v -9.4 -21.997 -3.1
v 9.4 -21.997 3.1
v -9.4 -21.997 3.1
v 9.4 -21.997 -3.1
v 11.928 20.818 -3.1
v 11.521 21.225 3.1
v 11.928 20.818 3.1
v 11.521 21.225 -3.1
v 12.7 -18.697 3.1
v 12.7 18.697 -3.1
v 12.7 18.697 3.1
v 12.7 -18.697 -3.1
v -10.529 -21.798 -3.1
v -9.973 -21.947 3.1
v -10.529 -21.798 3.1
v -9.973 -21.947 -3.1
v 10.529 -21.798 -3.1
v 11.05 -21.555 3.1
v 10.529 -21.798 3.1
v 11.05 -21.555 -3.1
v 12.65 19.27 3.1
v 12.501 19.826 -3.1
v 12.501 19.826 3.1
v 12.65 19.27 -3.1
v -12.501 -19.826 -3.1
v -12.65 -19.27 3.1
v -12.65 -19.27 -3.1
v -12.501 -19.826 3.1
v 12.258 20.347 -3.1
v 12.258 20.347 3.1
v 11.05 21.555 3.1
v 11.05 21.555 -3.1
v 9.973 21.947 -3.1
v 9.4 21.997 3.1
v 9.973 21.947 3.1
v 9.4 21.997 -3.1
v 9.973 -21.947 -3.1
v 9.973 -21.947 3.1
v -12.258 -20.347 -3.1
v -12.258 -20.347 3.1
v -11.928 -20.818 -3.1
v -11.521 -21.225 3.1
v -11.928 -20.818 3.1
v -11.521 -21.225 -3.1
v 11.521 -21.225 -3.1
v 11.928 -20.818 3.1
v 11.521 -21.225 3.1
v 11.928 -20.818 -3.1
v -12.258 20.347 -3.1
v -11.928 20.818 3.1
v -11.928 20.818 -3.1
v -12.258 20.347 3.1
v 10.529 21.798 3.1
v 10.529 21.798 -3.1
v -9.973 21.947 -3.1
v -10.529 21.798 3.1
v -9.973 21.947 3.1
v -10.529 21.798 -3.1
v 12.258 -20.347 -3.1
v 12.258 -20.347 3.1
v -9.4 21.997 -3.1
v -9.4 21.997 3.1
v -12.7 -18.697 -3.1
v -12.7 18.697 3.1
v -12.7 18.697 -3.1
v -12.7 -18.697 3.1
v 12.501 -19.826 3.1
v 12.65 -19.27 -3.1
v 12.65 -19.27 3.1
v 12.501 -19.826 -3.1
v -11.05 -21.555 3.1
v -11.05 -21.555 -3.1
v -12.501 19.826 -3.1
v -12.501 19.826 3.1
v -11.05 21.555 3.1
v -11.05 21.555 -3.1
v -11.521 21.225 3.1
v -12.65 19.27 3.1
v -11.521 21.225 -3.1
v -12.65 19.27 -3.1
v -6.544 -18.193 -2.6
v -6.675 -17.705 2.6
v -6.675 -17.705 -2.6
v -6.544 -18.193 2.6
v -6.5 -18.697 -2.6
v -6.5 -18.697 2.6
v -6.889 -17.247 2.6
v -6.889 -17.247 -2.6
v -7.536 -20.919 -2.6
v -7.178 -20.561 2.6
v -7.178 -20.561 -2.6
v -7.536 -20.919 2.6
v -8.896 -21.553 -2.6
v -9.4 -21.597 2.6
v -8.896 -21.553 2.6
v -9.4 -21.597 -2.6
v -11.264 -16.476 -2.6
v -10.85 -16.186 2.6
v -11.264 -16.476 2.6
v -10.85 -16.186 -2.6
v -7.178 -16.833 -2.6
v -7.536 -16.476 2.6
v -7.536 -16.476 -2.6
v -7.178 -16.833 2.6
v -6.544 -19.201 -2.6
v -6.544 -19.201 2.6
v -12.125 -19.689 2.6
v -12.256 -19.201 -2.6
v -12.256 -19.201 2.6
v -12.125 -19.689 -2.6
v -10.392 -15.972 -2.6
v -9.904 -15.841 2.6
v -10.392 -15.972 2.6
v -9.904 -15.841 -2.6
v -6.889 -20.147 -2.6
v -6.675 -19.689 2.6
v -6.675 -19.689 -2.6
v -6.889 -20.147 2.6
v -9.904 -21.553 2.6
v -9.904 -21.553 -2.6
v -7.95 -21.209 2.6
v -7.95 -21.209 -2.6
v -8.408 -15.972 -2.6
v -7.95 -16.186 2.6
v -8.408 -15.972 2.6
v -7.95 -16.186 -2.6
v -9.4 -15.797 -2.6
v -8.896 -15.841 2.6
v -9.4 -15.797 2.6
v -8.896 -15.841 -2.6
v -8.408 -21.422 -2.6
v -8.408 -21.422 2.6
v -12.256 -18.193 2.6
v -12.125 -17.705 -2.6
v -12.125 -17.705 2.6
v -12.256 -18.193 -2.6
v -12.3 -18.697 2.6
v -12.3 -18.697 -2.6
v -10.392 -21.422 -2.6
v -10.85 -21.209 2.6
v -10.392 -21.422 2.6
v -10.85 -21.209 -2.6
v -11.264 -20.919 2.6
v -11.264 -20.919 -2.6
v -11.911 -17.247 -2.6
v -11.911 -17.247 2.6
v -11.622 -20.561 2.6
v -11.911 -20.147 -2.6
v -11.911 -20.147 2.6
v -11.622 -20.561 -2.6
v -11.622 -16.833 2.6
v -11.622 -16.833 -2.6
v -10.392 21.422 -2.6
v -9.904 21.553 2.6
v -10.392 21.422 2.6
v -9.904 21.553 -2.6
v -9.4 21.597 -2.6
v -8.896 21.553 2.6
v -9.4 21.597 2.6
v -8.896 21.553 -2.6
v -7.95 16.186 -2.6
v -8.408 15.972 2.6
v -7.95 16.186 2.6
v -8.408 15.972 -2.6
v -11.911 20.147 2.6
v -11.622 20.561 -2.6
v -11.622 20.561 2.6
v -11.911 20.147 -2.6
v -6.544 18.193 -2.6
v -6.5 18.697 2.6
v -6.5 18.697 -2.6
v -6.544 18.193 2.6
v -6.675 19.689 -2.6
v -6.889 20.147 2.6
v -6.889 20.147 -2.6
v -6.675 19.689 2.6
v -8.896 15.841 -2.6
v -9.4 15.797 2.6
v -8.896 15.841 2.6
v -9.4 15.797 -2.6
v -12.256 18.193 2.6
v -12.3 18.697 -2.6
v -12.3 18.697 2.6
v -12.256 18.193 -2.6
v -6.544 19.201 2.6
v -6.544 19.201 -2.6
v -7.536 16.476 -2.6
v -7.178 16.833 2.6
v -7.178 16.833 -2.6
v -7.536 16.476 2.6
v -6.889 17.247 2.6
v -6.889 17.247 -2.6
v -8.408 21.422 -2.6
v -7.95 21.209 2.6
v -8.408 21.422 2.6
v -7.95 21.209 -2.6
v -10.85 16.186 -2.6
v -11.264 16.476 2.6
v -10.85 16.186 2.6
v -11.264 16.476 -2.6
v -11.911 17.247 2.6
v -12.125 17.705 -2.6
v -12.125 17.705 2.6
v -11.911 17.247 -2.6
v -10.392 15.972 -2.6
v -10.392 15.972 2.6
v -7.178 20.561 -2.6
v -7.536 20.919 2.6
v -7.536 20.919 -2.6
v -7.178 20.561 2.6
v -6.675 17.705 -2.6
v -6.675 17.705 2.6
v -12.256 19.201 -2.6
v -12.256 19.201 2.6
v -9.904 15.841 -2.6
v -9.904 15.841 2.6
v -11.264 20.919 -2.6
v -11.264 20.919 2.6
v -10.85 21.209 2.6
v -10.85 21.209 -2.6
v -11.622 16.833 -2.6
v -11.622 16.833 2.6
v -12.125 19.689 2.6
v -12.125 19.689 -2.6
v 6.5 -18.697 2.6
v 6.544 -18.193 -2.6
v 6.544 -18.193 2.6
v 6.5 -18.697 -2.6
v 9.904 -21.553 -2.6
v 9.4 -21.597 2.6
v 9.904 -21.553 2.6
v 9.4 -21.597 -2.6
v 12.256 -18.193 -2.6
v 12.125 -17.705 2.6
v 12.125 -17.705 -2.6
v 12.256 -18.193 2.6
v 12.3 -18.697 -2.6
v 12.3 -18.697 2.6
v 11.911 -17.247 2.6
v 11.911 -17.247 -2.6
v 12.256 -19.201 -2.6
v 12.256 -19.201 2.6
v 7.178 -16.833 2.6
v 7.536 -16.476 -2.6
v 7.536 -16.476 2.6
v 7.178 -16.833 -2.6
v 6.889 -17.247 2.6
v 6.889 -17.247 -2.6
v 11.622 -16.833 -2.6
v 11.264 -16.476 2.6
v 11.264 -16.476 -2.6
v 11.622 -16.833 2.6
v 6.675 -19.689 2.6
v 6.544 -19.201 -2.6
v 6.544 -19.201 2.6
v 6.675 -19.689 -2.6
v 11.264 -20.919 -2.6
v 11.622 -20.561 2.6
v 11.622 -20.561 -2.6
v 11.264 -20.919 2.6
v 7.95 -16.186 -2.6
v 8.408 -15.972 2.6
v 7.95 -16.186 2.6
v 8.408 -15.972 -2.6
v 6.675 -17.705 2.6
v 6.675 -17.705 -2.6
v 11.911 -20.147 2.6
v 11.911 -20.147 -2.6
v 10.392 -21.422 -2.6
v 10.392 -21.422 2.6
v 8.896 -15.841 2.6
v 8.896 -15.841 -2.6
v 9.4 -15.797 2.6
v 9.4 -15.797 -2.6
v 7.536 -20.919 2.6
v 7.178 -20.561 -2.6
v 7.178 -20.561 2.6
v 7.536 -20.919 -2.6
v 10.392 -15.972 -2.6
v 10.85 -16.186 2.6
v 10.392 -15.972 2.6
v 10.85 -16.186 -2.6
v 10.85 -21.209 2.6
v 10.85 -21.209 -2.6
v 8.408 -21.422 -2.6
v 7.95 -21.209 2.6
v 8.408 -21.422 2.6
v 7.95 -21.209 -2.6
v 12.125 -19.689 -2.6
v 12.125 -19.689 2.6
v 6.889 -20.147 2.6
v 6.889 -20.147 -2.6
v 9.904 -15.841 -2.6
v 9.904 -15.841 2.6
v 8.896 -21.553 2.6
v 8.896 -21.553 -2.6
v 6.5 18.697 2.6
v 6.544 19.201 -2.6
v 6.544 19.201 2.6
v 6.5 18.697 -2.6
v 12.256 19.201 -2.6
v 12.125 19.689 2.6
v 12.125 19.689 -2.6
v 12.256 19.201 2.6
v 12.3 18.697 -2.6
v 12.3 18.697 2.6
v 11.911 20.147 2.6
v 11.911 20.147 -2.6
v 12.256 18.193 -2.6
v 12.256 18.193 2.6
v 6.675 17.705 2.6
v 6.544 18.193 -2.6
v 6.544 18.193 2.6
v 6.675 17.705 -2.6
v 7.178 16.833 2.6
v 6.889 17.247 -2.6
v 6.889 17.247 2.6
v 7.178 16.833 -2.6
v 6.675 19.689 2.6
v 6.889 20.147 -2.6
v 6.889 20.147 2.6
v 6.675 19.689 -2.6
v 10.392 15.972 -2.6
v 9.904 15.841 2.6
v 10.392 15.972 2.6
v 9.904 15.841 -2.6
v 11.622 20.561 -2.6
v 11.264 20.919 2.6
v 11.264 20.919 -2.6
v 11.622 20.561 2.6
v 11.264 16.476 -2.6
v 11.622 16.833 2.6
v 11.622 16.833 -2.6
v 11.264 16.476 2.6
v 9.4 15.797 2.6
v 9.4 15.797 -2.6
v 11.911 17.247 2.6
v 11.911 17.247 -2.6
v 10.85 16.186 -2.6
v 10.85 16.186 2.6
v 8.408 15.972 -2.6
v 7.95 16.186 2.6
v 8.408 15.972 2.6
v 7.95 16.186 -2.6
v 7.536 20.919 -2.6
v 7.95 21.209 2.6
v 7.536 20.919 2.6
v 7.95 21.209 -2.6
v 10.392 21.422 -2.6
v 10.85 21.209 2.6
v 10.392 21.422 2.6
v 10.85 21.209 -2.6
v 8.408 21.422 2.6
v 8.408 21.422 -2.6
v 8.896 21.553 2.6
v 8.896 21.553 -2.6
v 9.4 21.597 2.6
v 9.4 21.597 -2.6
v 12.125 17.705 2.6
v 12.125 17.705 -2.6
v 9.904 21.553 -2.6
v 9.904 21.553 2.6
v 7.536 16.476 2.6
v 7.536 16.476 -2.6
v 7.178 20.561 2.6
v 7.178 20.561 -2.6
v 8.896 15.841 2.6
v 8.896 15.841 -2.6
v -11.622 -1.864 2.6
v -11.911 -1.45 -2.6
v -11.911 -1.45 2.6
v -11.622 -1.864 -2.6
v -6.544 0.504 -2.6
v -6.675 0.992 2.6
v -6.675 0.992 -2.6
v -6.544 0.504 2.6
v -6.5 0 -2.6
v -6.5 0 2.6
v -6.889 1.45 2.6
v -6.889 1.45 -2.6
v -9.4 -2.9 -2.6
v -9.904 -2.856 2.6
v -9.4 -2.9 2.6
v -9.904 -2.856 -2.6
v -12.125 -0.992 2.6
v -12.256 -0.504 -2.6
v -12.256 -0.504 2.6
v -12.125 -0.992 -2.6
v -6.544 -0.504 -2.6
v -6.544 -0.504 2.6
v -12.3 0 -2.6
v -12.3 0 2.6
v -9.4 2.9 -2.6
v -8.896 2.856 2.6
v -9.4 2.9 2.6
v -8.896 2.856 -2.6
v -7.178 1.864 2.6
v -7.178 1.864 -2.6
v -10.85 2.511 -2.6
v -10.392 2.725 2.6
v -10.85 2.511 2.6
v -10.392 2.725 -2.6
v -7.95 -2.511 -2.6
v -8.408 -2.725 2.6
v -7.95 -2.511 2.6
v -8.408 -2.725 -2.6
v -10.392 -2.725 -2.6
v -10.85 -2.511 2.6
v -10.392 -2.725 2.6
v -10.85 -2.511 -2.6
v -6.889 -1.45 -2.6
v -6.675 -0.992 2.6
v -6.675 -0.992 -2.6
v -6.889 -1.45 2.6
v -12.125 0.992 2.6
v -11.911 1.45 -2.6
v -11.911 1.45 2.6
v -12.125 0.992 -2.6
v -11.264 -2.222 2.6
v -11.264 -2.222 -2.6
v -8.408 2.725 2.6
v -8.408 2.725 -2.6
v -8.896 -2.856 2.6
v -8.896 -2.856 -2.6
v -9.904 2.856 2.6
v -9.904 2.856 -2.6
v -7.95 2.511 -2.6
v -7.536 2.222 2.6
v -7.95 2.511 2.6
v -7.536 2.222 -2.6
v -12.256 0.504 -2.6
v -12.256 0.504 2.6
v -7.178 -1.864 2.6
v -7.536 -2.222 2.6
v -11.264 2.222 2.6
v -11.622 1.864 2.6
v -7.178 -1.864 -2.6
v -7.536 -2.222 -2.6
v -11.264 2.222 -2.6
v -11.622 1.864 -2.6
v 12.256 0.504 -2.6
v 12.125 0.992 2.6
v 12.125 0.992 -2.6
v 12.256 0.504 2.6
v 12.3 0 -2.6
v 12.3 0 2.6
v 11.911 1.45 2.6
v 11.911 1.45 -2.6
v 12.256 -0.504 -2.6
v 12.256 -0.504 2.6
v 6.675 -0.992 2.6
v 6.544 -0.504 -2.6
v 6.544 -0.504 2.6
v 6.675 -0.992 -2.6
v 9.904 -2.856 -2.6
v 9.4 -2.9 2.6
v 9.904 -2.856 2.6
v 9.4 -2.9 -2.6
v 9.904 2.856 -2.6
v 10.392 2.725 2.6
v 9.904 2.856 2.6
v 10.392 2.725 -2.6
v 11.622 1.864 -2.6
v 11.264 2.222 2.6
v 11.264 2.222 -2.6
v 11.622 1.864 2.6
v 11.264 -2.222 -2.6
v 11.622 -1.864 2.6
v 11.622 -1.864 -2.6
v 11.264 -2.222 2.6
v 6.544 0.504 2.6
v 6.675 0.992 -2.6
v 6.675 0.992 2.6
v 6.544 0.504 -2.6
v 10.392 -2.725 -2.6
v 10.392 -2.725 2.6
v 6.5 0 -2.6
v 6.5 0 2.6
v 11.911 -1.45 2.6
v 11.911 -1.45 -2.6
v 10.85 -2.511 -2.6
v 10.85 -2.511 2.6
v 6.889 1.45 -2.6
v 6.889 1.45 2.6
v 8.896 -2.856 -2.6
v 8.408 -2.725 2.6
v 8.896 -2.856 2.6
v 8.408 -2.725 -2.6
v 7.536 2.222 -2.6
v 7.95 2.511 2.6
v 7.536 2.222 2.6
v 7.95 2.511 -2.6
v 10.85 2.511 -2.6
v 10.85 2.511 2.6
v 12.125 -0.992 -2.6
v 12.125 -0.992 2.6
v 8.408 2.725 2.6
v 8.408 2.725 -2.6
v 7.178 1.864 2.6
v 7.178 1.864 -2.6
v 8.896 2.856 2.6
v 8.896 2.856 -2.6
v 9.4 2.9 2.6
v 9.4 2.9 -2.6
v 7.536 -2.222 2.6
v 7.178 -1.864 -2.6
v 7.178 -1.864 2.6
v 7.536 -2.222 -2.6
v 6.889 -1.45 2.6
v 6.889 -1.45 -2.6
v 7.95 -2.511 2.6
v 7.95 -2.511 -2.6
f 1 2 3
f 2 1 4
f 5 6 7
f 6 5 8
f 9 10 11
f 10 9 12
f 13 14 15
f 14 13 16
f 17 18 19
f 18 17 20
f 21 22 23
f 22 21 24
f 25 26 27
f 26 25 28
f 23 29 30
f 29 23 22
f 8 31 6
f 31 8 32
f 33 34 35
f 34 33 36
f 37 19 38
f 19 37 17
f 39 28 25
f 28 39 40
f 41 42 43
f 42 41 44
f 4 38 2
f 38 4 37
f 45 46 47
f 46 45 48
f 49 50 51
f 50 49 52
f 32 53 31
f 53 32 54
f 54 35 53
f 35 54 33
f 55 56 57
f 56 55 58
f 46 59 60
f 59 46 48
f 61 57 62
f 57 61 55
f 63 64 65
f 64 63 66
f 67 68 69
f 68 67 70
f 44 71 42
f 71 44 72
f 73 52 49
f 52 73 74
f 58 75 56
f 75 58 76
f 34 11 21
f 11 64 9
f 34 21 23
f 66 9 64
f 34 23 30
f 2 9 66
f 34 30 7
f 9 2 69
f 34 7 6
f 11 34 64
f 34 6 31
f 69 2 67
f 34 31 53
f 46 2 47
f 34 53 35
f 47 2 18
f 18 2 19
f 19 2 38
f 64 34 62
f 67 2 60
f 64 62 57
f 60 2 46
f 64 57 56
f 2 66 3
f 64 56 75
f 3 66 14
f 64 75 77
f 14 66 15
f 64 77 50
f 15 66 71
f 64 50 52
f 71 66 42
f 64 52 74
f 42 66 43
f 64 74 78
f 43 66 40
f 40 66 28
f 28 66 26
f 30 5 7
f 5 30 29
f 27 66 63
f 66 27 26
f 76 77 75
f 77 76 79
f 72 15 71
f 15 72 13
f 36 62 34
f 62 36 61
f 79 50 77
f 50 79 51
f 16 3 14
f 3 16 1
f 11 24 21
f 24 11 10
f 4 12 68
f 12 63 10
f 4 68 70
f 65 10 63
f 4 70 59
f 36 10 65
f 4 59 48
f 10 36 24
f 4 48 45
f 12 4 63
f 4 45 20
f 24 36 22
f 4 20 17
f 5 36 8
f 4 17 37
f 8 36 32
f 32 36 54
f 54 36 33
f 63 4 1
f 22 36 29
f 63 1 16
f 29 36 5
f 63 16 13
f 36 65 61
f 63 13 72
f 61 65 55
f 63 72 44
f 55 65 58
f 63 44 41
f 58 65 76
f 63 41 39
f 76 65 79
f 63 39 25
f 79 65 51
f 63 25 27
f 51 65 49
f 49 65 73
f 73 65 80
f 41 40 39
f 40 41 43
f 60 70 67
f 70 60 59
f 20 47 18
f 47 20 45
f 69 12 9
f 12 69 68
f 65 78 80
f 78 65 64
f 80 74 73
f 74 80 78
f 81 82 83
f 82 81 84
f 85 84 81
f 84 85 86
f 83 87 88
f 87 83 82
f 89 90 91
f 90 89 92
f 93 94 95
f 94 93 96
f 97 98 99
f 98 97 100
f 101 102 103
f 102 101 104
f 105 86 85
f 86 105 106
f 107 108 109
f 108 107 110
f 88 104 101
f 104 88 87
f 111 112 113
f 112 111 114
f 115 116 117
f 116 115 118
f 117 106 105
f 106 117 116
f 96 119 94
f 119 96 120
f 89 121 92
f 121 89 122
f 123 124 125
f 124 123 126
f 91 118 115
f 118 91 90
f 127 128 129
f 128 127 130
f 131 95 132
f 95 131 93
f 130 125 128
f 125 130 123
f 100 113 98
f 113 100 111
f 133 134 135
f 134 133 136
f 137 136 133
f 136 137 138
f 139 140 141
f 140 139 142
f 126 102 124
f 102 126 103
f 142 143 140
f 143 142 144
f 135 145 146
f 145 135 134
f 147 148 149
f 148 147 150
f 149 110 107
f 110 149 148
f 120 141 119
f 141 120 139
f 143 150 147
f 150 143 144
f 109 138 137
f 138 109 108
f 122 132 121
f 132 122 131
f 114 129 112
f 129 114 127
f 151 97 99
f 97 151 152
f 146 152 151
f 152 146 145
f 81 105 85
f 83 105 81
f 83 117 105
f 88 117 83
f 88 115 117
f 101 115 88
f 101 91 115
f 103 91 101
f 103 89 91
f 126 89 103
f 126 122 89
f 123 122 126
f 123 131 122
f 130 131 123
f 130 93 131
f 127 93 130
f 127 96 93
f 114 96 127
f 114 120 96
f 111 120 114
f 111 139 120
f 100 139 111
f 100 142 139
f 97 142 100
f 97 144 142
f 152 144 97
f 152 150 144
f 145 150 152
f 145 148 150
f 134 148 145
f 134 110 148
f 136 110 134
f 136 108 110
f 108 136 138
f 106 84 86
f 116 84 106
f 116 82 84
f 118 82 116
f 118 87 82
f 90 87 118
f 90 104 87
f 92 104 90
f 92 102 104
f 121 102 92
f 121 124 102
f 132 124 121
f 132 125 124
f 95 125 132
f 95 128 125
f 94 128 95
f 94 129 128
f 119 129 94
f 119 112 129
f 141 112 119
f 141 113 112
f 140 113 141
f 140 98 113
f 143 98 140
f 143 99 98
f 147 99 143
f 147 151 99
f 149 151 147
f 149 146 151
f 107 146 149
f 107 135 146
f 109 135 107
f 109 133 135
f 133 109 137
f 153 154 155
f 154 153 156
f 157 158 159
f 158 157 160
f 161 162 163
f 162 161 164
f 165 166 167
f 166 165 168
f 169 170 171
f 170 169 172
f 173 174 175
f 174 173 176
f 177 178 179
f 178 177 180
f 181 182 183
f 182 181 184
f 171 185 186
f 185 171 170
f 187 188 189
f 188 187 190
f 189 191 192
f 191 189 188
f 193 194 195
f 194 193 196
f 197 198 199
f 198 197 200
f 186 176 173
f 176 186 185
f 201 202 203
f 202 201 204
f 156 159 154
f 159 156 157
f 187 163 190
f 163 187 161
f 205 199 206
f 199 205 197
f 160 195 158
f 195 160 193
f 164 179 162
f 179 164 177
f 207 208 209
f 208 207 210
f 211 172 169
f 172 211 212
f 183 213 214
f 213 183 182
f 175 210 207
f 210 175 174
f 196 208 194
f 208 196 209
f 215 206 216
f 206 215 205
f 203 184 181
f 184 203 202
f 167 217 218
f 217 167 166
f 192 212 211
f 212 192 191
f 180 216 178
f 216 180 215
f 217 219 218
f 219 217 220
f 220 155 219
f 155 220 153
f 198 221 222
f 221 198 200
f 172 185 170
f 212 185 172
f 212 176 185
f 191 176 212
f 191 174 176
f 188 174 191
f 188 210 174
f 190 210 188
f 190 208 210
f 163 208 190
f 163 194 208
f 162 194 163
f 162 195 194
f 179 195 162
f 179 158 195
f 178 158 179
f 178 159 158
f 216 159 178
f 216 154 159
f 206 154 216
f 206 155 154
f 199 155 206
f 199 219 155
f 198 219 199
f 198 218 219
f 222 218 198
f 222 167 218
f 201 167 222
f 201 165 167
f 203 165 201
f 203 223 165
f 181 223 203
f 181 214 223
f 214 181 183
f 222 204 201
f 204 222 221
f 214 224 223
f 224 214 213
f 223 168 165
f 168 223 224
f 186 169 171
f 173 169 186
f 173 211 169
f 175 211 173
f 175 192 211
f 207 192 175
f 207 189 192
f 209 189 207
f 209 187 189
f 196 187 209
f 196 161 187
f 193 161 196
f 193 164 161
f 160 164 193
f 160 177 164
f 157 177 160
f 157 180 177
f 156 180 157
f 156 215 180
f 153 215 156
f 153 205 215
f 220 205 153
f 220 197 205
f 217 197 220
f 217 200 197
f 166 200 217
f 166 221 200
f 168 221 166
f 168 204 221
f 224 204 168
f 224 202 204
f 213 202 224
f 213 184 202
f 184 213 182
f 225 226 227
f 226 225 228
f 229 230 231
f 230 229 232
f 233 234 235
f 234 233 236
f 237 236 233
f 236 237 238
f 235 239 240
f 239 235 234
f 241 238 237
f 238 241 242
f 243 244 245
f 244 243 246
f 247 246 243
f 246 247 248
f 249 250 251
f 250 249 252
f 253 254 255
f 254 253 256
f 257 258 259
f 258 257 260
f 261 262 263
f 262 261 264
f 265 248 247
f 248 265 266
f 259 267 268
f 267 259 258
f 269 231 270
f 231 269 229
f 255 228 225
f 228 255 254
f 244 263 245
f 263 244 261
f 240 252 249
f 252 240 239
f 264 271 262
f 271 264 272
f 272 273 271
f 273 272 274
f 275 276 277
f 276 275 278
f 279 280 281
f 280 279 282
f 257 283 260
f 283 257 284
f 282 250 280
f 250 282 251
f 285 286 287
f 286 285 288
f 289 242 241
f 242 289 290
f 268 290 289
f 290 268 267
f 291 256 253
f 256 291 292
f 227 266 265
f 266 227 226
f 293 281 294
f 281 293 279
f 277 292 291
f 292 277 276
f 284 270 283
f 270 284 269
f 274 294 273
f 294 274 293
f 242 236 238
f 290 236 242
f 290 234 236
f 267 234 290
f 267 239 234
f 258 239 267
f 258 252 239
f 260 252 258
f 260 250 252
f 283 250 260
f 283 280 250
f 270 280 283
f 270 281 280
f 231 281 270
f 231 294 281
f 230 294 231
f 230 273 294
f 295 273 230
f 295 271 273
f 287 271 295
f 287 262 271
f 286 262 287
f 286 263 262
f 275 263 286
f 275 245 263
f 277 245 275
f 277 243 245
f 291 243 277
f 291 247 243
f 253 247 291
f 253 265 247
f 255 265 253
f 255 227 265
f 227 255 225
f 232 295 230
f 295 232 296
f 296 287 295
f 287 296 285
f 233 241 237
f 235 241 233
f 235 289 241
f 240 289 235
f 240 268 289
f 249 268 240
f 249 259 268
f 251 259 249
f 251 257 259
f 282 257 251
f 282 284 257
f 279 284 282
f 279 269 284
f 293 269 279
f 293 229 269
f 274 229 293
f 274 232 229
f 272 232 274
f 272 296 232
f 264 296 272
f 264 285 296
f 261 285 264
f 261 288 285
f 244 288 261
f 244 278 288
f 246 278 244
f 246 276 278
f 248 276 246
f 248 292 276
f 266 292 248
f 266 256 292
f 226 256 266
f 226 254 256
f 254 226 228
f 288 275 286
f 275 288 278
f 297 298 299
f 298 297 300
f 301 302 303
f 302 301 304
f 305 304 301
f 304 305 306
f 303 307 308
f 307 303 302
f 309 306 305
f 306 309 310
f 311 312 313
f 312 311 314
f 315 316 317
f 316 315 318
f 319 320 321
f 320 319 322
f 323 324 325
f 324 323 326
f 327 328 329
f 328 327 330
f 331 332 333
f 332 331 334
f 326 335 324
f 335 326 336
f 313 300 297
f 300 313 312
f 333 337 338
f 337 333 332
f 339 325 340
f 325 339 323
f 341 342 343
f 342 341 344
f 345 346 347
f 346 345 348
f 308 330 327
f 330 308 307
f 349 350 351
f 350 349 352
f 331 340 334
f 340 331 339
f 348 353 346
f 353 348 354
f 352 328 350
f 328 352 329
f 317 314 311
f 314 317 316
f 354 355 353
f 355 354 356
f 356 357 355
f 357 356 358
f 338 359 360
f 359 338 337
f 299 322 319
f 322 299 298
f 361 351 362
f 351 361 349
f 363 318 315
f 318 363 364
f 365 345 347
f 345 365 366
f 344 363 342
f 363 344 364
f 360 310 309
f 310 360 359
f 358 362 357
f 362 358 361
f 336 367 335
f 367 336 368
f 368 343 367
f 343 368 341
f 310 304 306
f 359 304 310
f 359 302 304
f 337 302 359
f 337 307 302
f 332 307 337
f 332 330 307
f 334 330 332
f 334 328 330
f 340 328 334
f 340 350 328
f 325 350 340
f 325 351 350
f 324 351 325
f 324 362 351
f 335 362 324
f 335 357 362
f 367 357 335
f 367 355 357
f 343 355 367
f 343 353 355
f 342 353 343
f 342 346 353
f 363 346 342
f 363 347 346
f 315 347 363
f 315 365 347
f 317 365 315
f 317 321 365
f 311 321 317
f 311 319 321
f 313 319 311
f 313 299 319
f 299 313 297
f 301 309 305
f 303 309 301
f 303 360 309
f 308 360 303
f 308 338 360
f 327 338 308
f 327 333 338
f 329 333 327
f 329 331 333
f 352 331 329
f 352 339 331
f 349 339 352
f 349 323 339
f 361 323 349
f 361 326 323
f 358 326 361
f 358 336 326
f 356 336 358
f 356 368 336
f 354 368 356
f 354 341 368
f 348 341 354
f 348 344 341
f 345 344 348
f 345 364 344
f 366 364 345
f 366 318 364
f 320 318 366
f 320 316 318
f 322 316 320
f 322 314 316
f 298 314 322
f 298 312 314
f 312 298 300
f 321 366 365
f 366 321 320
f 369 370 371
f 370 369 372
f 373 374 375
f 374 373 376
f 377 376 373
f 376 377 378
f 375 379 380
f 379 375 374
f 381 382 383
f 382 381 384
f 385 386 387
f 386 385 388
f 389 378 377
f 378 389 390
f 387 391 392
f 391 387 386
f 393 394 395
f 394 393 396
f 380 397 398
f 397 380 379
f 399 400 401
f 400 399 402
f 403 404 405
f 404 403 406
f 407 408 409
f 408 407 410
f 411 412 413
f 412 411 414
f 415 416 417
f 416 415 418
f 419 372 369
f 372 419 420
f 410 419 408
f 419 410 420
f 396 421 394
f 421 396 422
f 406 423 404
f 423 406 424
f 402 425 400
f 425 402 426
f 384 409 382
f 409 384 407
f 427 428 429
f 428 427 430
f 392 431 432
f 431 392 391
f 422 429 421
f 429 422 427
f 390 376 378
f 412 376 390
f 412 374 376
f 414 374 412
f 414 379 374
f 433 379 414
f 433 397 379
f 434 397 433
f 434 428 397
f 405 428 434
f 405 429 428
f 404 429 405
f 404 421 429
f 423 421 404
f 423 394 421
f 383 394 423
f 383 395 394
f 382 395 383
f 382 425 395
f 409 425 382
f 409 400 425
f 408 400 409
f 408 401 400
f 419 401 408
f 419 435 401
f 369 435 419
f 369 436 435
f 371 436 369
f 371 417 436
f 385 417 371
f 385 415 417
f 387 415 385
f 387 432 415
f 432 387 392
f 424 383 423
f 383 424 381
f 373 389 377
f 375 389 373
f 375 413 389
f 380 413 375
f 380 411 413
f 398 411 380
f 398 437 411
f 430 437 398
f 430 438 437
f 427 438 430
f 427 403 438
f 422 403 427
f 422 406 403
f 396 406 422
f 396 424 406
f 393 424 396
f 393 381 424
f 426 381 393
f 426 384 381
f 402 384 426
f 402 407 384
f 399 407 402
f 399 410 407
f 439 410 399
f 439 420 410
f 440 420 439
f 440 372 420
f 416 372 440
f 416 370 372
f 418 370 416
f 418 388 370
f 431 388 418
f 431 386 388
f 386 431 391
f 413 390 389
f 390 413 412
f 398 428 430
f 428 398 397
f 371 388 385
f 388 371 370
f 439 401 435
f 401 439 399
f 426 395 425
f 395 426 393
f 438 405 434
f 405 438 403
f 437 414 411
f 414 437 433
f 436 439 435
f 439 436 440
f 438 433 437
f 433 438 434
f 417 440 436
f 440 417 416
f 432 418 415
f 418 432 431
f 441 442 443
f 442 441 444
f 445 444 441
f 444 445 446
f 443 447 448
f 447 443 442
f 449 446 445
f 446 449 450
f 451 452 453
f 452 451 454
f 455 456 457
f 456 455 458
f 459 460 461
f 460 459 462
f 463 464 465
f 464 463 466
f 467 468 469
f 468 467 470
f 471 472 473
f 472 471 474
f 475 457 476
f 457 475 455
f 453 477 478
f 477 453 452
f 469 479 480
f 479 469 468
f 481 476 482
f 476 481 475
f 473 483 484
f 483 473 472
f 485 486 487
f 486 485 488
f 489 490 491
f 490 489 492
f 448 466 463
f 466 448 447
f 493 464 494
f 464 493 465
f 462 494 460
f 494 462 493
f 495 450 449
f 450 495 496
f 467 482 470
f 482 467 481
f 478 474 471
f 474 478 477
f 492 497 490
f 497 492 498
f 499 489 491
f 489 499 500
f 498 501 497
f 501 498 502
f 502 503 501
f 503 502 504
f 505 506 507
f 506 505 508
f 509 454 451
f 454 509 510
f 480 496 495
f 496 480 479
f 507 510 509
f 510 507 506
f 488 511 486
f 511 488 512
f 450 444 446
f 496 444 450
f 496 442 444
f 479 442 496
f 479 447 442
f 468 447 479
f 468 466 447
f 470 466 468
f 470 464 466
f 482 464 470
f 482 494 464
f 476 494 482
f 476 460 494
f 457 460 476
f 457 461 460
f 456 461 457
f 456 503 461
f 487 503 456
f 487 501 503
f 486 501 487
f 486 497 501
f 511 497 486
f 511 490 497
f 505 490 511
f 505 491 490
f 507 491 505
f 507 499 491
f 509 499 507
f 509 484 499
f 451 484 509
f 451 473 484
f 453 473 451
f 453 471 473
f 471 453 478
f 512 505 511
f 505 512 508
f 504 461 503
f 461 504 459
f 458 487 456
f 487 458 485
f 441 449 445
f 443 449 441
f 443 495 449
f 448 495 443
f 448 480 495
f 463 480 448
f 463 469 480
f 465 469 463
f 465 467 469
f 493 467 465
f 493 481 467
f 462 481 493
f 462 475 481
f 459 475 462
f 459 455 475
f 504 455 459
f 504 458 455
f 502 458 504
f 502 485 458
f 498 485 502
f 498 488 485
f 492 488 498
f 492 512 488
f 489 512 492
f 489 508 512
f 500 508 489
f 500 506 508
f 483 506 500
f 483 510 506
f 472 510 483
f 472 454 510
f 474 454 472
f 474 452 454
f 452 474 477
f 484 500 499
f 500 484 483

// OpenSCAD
//
// hill5ide.scad
//

// unit is mm

inch = 25.4;
o2 = 0.2;
bd = 5; // ball diameter
br = bd / 2; // ball radius

h = bd + 6 * 0.2;
echo("h", h);

r = inch / 2;
t = r / cos(30);

l0 = inch;
l1 = 3 * t;


module panel() {

  bar = br + 2 * o2;
  baro2 = bar + 2 * o2;

  module balcyl() {
    cylinder(r=bar, h=br * 2 + o2, center=true, $fn=36);
  }
  module outcyl() {
    cylinder(r=bar + 2 * o2, h=h, center=true, $fn=36);
  }

  difference() {

    //cube(size=[ l0, l1, h ], center=true);
    hull() {
      translate([ -l0 / 2 + baro2, -l1 / 2 + baro2, 0 ]) outcyl();
      translate([ -l0 / 2 + baro2, l1 / 2 - baro2, 0 ]) outcyl();
      translate([ l0 / 2 - baro2, -l1 / 2 + baro2, 0 ]) outcyl();
      translate([ l0 / 2 - baro2, l1 / 2 - baro2, 0 ]) outcyl();
    }

    translate([ -l0 / 2 + baro2, -l1 / 2 + baro2, 0 ]) balcyl();
    translate([ -l0 / 2 + baro2, l1 / 2 - baro2, 0 ]) balcyl();
    translate([ l0 / 2 - baro2, -l1 / 2 + baro2, 0 ]) balcyl();
    translate([ l0 / 2 - baro2, l1 / 2 - baro2, 0 ]) balcyl();

    translate([ -l0 / 2 + baro2, 0, 0 ]) balcyl();
    translate([ l0 / 2 - baro2, 0, 0 ]) balcyl();
  }
}

panel();
